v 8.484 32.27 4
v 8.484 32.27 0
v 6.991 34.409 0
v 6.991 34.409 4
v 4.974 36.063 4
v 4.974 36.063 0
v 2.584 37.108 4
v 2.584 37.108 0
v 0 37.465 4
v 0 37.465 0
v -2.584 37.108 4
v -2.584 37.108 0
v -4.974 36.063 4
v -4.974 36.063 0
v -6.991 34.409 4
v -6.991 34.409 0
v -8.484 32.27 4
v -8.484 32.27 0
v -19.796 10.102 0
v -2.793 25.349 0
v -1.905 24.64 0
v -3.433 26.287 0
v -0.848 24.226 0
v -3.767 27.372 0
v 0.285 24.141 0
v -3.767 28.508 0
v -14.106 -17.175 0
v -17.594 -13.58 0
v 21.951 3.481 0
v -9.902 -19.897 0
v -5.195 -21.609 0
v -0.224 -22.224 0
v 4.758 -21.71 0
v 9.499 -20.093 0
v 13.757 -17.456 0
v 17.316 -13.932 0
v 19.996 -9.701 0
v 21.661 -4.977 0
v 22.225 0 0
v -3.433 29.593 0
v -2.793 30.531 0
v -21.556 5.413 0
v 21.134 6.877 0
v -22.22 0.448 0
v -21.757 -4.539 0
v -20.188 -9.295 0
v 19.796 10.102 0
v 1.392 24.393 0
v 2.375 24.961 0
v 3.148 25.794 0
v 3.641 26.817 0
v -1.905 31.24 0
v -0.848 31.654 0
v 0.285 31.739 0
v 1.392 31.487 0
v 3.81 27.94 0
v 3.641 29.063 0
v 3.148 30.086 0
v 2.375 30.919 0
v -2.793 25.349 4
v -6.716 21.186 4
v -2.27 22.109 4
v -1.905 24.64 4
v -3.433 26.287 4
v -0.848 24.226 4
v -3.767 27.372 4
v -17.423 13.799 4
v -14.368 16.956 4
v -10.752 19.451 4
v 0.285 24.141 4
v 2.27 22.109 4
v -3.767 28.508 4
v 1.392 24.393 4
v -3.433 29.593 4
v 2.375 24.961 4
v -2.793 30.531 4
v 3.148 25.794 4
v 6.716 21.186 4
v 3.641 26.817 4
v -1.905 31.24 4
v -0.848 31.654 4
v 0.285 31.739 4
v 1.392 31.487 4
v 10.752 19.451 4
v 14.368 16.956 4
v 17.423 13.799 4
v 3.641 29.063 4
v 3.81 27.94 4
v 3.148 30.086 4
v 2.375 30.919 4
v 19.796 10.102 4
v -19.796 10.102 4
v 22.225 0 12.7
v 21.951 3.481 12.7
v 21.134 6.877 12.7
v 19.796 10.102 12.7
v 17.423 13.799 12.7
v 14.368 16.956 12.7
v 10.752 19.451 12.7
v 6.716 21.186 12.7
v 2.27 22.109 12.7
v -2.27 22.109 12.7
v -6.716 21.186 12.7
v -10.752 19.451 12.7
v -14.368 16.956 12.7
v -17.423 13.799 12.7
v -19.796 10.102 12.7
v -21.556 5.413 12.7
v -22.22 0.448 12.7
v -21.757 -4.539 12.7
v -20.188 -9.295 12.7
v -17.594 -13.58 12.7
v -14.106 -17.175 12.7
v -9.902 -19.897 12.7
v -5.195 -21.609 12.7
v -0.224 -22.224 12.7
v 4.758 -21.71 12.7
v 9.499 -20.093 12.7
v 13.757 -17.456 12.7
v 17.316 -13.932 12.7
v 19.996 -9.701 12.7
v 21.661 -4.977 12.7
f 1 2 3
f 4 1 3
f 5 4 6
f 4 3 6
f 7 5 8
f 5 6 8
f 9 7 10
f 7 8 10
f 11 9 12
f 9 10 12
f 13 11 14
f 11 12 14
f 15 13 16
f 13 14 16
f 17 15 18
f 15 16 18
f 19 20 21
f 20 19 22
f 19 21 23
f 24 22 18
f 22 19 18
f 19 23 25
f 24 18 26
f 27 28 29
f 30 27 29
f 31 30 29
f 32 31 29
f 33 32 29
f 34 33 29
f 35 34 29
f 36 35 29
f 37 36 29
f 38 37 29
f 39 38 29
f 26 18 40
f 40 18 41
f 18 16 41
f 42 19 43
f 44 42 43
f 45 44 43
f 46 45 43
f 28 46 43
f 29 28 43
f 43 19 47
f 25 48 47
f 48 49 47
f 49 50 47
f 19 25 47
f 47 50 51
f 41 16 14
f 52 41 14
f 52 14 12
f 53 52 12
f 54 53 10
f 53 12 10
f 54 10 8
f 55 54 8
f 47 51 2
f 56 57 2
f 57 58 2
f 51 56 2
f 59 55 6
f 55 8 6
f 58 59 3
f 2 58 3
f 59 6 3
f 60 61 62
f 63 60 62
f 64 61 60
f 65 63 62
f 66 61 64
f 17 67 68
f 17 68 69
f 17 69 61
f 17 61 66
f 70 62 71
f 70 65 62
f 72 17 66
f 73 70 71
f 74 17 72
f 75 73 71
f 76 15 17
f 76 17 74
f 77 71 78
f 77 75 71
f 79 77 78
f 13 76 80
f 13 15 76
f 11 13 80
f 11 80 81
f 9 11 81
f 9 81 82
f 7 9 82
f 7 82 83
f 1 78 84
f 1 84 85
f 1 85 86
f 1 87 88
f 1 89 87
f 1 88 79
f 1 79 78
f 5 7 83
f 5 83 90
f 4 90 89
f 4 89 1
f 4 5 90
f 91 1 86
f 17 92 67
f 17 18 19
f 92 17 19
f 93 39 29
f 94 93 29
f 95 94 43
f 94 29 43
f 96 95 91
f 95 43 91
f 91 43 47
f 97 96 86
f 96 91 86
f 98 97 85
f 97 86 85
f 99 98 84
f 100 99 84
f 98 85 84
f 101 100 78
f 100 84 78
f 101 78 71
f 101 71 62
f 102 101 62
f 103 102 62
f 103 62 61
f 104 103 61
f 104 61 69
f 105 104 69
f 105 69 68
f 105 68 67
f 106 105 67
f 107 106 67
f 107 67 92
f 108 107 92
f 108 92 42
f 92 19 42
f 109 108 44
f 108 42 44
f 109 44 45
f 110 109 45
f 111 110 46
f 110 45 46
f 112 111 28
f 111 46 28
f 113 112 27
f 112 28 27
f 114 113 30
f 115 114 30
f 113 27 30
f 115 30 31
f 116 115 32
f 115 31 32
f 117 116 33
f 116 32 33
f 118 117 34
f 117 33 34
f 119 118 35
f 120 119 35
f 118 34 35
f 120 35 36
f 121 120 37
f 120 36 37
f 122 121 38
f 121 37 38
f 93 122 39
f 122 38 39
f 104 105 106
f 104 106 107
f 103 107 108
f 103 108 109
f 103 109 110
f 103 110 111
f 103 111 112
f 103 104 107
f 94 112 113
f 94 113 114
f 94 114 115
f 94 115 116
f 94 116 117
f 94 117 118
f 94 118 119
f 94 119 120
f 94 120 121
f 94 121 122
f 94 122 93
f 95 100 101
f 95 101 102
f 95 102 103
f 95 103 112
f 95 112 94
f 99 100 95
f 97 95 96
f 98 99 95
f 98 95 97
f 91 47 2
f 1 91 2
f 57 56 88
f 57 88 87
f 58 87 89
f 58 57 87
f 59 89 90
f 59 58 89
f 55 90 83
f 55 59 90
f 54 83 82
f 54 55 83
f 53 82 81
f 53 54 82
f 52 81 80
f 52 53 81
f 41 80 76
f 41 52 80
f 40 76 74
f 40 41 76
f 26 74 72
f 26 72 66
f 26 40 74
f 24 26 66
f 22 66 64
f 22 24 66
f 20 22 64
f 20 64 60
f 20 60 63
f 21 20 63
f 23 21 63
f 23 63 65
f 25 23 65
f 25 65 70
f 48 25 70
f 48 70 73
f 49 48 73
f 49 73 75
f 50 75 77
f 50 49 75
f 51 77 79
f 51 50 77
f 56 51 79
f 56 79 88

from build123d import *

# Parameters (mm, degrees)
F0_R     = 3.81
F1_DEPTH = 4
F2_DEPTH = 12.7
F3_DEPTH = 10


# Not quite as in the source:
# - a feature names something its author has since deleted; it is built from what else it names


with BuildPart() as f1:
    # F0 (on Top) → F1 (new body)
    with BuildSketch(Plane.XY):
        with BuildLine():
            ThreePointArc((6.7162400934, 21.1859090909), (14.3680496868, 16.9561131513), (19.7963307394, 10.1022727273))
            Line((19.7963307394, 10.1022727273), (8.4841417455, 32.2695454545))
            ThreePointArc((8.4841417455, 32.2695454545), (9.2611304689, 30.1664517595), (9.525, 27.94))
            ThreePointArc((9.525, 27.94), (8.7948226784, 24.2825802736), (6.7162400934, 21.1859090909))
        make_face()
        with BuildLine():
            Line((-8.4841417455, 32.2695454545), (-19.7963307394, 10.1022727273))
            ThreePointArc((-19.7963307394, 10.1022727273), (-14.3680496868, 16.9561131513), (-6.7162400934, 21.1859090909))
            ThreePointArc((-6.7162400934, 21.1859090909), (-9.4060964683, 26.4396752924), (-8.4841417455, 32.2695454545))
        make_face()
        with BuildLine():
            ThreePointArc((-19.7963307394, 10.1022727273), (-5.1950541054, -21.6093044275), (22.225, 0))
            ThreePointArc((22.225, 0), (21.6093044275, 5.1950541054), (19.7963307394, 10.1022727273))
            ThreePointArc((19.7963307394, 10.1022727273), (14.3680496868, 16.9561131513), (6.7162400934, 21.1859090909))
            ThreePointArc((6.7162400934, 21.1859090909), (0, 18.415), (-6.7162400934, 21.1859090909))
            ThreePointArc((-6.7162400934, 21.1859090909), (-14.3680496868, 16.9561131513), (-19.7963307394, 10.1022727273))
        make_face()
        with BuildLine():
            ThreePointArc((-6.7162400934, 21.1859090909), (0, 22.225), (6.7162400934, 21.1859090909))
            ThreePointArc((6.7162400934, 21.1859090909), (8.7948226784, 24.2825802736), (9.525, 27.94))
            ThreePointArc((9.525, 27.94), (9.2611304689, 30.1664517595), (8.4841417455, 32.2695454545))
            ThreePointArc((8.4841417455, 32.2695454545), (0, 37.465), (-8.4841417455, 32.2695454545))
            ThreePointArc((-8.4841417455, 32.2695454545), (-9.4060964683, 26.4396752924), (-6.7162400934, 21.1859090909))
        make_face()
        with Locations((0, 27.94)):
            Circle(F0_R, mode=Mode.SUBTRACT)
        with BuildLine():
            ThreePointArc((-6.7162400934, 21.1859090909), (0, 18.415), (6.7162400934, 21.1859090909))
            ThreePointArc((6.7162400934, 21.1859090909), (0, 22.225), (-6.7162400934, 21.1859090909))
        make_face()
    extrude(amount=F1_DEPTH)

    # F0 (on Top) → F2 (join)
    with BuildSketch(Plane.XY):
        with BuildLine():
            ThreePointArc((-19.7963307394, 10.1022727273), (-5.1950541054, -21.6093044275), (22.225, 0))
            ThreePointArc((22.225, 0), (21.6093044275, 5.1950541054), (19.7963307394, 10.1022727273))
            ThreePointArc((19.7963307394, 10.1022727273), (14.3680496868, 16.9561131513), (6.7162400934, 21.1859090909))
            ThreePointArc((6.7162400934, 21.1859090909), (0, 18.415), (-6.7162400934, 21.1859090909))
            ThreePointArc((-6.7162400934, 21.1859090909), (-14.3680496868, 16.9561131513), (-19.7963307394, 10.1022727273))
        make_face()
        with BuildLine():
            ThreePointArc((-6.7162400934, 21.1859090909), (0, 18.415), (6.7162400934, 21.1859090909))
            ThreePointArc((6.7162400934, 21.1859090909), (0, 22.225), (-6.7162400934, 21.1859090909))
        make_face()
    extrude(amount=F2_DEPTH)

    # F0 (on Top) → F3 (join)
    with BuildSketch(Plane.XY):
        with BuildLine():
            ThreePointArc((-6.7162400934, 21.1859090909), (0, 18.415), (6.7162400934, 21.1859090909))
            ThreePointArc((6.7162400934, 21.1859090909), (0, 22.225), (-6.7162400934, 21.1859090909))
        make_face()
        with BuildLine():
            ThreePointArc((-19.7963307394, 10.1022727273), (-5.1950541054, -21.6093044275), (22.225, 0))
            ThreePointArc((22.225, 0), (21.6093044275, 5.1950541054), (19.7963307394, 10.1022727273))
            ThreePointArc((19.7963307394, 10.1022727273), (14.3680496868, 16.9561131513), (6.7162400934, 21.1859090909))
            ThreePointArc((6.7162400934, 21.1859090909), (0, 18.415), (-6.7162400934, 21.1859090909))
            ThreePointArc((-6.7162400934, 21.1859090909), (-14.3680496868, 16.9561131513), (-19.7963307394, 10.1022727273))
        make_face()
    extrude(amount=F3_DEPTH)


solid = f1.part
